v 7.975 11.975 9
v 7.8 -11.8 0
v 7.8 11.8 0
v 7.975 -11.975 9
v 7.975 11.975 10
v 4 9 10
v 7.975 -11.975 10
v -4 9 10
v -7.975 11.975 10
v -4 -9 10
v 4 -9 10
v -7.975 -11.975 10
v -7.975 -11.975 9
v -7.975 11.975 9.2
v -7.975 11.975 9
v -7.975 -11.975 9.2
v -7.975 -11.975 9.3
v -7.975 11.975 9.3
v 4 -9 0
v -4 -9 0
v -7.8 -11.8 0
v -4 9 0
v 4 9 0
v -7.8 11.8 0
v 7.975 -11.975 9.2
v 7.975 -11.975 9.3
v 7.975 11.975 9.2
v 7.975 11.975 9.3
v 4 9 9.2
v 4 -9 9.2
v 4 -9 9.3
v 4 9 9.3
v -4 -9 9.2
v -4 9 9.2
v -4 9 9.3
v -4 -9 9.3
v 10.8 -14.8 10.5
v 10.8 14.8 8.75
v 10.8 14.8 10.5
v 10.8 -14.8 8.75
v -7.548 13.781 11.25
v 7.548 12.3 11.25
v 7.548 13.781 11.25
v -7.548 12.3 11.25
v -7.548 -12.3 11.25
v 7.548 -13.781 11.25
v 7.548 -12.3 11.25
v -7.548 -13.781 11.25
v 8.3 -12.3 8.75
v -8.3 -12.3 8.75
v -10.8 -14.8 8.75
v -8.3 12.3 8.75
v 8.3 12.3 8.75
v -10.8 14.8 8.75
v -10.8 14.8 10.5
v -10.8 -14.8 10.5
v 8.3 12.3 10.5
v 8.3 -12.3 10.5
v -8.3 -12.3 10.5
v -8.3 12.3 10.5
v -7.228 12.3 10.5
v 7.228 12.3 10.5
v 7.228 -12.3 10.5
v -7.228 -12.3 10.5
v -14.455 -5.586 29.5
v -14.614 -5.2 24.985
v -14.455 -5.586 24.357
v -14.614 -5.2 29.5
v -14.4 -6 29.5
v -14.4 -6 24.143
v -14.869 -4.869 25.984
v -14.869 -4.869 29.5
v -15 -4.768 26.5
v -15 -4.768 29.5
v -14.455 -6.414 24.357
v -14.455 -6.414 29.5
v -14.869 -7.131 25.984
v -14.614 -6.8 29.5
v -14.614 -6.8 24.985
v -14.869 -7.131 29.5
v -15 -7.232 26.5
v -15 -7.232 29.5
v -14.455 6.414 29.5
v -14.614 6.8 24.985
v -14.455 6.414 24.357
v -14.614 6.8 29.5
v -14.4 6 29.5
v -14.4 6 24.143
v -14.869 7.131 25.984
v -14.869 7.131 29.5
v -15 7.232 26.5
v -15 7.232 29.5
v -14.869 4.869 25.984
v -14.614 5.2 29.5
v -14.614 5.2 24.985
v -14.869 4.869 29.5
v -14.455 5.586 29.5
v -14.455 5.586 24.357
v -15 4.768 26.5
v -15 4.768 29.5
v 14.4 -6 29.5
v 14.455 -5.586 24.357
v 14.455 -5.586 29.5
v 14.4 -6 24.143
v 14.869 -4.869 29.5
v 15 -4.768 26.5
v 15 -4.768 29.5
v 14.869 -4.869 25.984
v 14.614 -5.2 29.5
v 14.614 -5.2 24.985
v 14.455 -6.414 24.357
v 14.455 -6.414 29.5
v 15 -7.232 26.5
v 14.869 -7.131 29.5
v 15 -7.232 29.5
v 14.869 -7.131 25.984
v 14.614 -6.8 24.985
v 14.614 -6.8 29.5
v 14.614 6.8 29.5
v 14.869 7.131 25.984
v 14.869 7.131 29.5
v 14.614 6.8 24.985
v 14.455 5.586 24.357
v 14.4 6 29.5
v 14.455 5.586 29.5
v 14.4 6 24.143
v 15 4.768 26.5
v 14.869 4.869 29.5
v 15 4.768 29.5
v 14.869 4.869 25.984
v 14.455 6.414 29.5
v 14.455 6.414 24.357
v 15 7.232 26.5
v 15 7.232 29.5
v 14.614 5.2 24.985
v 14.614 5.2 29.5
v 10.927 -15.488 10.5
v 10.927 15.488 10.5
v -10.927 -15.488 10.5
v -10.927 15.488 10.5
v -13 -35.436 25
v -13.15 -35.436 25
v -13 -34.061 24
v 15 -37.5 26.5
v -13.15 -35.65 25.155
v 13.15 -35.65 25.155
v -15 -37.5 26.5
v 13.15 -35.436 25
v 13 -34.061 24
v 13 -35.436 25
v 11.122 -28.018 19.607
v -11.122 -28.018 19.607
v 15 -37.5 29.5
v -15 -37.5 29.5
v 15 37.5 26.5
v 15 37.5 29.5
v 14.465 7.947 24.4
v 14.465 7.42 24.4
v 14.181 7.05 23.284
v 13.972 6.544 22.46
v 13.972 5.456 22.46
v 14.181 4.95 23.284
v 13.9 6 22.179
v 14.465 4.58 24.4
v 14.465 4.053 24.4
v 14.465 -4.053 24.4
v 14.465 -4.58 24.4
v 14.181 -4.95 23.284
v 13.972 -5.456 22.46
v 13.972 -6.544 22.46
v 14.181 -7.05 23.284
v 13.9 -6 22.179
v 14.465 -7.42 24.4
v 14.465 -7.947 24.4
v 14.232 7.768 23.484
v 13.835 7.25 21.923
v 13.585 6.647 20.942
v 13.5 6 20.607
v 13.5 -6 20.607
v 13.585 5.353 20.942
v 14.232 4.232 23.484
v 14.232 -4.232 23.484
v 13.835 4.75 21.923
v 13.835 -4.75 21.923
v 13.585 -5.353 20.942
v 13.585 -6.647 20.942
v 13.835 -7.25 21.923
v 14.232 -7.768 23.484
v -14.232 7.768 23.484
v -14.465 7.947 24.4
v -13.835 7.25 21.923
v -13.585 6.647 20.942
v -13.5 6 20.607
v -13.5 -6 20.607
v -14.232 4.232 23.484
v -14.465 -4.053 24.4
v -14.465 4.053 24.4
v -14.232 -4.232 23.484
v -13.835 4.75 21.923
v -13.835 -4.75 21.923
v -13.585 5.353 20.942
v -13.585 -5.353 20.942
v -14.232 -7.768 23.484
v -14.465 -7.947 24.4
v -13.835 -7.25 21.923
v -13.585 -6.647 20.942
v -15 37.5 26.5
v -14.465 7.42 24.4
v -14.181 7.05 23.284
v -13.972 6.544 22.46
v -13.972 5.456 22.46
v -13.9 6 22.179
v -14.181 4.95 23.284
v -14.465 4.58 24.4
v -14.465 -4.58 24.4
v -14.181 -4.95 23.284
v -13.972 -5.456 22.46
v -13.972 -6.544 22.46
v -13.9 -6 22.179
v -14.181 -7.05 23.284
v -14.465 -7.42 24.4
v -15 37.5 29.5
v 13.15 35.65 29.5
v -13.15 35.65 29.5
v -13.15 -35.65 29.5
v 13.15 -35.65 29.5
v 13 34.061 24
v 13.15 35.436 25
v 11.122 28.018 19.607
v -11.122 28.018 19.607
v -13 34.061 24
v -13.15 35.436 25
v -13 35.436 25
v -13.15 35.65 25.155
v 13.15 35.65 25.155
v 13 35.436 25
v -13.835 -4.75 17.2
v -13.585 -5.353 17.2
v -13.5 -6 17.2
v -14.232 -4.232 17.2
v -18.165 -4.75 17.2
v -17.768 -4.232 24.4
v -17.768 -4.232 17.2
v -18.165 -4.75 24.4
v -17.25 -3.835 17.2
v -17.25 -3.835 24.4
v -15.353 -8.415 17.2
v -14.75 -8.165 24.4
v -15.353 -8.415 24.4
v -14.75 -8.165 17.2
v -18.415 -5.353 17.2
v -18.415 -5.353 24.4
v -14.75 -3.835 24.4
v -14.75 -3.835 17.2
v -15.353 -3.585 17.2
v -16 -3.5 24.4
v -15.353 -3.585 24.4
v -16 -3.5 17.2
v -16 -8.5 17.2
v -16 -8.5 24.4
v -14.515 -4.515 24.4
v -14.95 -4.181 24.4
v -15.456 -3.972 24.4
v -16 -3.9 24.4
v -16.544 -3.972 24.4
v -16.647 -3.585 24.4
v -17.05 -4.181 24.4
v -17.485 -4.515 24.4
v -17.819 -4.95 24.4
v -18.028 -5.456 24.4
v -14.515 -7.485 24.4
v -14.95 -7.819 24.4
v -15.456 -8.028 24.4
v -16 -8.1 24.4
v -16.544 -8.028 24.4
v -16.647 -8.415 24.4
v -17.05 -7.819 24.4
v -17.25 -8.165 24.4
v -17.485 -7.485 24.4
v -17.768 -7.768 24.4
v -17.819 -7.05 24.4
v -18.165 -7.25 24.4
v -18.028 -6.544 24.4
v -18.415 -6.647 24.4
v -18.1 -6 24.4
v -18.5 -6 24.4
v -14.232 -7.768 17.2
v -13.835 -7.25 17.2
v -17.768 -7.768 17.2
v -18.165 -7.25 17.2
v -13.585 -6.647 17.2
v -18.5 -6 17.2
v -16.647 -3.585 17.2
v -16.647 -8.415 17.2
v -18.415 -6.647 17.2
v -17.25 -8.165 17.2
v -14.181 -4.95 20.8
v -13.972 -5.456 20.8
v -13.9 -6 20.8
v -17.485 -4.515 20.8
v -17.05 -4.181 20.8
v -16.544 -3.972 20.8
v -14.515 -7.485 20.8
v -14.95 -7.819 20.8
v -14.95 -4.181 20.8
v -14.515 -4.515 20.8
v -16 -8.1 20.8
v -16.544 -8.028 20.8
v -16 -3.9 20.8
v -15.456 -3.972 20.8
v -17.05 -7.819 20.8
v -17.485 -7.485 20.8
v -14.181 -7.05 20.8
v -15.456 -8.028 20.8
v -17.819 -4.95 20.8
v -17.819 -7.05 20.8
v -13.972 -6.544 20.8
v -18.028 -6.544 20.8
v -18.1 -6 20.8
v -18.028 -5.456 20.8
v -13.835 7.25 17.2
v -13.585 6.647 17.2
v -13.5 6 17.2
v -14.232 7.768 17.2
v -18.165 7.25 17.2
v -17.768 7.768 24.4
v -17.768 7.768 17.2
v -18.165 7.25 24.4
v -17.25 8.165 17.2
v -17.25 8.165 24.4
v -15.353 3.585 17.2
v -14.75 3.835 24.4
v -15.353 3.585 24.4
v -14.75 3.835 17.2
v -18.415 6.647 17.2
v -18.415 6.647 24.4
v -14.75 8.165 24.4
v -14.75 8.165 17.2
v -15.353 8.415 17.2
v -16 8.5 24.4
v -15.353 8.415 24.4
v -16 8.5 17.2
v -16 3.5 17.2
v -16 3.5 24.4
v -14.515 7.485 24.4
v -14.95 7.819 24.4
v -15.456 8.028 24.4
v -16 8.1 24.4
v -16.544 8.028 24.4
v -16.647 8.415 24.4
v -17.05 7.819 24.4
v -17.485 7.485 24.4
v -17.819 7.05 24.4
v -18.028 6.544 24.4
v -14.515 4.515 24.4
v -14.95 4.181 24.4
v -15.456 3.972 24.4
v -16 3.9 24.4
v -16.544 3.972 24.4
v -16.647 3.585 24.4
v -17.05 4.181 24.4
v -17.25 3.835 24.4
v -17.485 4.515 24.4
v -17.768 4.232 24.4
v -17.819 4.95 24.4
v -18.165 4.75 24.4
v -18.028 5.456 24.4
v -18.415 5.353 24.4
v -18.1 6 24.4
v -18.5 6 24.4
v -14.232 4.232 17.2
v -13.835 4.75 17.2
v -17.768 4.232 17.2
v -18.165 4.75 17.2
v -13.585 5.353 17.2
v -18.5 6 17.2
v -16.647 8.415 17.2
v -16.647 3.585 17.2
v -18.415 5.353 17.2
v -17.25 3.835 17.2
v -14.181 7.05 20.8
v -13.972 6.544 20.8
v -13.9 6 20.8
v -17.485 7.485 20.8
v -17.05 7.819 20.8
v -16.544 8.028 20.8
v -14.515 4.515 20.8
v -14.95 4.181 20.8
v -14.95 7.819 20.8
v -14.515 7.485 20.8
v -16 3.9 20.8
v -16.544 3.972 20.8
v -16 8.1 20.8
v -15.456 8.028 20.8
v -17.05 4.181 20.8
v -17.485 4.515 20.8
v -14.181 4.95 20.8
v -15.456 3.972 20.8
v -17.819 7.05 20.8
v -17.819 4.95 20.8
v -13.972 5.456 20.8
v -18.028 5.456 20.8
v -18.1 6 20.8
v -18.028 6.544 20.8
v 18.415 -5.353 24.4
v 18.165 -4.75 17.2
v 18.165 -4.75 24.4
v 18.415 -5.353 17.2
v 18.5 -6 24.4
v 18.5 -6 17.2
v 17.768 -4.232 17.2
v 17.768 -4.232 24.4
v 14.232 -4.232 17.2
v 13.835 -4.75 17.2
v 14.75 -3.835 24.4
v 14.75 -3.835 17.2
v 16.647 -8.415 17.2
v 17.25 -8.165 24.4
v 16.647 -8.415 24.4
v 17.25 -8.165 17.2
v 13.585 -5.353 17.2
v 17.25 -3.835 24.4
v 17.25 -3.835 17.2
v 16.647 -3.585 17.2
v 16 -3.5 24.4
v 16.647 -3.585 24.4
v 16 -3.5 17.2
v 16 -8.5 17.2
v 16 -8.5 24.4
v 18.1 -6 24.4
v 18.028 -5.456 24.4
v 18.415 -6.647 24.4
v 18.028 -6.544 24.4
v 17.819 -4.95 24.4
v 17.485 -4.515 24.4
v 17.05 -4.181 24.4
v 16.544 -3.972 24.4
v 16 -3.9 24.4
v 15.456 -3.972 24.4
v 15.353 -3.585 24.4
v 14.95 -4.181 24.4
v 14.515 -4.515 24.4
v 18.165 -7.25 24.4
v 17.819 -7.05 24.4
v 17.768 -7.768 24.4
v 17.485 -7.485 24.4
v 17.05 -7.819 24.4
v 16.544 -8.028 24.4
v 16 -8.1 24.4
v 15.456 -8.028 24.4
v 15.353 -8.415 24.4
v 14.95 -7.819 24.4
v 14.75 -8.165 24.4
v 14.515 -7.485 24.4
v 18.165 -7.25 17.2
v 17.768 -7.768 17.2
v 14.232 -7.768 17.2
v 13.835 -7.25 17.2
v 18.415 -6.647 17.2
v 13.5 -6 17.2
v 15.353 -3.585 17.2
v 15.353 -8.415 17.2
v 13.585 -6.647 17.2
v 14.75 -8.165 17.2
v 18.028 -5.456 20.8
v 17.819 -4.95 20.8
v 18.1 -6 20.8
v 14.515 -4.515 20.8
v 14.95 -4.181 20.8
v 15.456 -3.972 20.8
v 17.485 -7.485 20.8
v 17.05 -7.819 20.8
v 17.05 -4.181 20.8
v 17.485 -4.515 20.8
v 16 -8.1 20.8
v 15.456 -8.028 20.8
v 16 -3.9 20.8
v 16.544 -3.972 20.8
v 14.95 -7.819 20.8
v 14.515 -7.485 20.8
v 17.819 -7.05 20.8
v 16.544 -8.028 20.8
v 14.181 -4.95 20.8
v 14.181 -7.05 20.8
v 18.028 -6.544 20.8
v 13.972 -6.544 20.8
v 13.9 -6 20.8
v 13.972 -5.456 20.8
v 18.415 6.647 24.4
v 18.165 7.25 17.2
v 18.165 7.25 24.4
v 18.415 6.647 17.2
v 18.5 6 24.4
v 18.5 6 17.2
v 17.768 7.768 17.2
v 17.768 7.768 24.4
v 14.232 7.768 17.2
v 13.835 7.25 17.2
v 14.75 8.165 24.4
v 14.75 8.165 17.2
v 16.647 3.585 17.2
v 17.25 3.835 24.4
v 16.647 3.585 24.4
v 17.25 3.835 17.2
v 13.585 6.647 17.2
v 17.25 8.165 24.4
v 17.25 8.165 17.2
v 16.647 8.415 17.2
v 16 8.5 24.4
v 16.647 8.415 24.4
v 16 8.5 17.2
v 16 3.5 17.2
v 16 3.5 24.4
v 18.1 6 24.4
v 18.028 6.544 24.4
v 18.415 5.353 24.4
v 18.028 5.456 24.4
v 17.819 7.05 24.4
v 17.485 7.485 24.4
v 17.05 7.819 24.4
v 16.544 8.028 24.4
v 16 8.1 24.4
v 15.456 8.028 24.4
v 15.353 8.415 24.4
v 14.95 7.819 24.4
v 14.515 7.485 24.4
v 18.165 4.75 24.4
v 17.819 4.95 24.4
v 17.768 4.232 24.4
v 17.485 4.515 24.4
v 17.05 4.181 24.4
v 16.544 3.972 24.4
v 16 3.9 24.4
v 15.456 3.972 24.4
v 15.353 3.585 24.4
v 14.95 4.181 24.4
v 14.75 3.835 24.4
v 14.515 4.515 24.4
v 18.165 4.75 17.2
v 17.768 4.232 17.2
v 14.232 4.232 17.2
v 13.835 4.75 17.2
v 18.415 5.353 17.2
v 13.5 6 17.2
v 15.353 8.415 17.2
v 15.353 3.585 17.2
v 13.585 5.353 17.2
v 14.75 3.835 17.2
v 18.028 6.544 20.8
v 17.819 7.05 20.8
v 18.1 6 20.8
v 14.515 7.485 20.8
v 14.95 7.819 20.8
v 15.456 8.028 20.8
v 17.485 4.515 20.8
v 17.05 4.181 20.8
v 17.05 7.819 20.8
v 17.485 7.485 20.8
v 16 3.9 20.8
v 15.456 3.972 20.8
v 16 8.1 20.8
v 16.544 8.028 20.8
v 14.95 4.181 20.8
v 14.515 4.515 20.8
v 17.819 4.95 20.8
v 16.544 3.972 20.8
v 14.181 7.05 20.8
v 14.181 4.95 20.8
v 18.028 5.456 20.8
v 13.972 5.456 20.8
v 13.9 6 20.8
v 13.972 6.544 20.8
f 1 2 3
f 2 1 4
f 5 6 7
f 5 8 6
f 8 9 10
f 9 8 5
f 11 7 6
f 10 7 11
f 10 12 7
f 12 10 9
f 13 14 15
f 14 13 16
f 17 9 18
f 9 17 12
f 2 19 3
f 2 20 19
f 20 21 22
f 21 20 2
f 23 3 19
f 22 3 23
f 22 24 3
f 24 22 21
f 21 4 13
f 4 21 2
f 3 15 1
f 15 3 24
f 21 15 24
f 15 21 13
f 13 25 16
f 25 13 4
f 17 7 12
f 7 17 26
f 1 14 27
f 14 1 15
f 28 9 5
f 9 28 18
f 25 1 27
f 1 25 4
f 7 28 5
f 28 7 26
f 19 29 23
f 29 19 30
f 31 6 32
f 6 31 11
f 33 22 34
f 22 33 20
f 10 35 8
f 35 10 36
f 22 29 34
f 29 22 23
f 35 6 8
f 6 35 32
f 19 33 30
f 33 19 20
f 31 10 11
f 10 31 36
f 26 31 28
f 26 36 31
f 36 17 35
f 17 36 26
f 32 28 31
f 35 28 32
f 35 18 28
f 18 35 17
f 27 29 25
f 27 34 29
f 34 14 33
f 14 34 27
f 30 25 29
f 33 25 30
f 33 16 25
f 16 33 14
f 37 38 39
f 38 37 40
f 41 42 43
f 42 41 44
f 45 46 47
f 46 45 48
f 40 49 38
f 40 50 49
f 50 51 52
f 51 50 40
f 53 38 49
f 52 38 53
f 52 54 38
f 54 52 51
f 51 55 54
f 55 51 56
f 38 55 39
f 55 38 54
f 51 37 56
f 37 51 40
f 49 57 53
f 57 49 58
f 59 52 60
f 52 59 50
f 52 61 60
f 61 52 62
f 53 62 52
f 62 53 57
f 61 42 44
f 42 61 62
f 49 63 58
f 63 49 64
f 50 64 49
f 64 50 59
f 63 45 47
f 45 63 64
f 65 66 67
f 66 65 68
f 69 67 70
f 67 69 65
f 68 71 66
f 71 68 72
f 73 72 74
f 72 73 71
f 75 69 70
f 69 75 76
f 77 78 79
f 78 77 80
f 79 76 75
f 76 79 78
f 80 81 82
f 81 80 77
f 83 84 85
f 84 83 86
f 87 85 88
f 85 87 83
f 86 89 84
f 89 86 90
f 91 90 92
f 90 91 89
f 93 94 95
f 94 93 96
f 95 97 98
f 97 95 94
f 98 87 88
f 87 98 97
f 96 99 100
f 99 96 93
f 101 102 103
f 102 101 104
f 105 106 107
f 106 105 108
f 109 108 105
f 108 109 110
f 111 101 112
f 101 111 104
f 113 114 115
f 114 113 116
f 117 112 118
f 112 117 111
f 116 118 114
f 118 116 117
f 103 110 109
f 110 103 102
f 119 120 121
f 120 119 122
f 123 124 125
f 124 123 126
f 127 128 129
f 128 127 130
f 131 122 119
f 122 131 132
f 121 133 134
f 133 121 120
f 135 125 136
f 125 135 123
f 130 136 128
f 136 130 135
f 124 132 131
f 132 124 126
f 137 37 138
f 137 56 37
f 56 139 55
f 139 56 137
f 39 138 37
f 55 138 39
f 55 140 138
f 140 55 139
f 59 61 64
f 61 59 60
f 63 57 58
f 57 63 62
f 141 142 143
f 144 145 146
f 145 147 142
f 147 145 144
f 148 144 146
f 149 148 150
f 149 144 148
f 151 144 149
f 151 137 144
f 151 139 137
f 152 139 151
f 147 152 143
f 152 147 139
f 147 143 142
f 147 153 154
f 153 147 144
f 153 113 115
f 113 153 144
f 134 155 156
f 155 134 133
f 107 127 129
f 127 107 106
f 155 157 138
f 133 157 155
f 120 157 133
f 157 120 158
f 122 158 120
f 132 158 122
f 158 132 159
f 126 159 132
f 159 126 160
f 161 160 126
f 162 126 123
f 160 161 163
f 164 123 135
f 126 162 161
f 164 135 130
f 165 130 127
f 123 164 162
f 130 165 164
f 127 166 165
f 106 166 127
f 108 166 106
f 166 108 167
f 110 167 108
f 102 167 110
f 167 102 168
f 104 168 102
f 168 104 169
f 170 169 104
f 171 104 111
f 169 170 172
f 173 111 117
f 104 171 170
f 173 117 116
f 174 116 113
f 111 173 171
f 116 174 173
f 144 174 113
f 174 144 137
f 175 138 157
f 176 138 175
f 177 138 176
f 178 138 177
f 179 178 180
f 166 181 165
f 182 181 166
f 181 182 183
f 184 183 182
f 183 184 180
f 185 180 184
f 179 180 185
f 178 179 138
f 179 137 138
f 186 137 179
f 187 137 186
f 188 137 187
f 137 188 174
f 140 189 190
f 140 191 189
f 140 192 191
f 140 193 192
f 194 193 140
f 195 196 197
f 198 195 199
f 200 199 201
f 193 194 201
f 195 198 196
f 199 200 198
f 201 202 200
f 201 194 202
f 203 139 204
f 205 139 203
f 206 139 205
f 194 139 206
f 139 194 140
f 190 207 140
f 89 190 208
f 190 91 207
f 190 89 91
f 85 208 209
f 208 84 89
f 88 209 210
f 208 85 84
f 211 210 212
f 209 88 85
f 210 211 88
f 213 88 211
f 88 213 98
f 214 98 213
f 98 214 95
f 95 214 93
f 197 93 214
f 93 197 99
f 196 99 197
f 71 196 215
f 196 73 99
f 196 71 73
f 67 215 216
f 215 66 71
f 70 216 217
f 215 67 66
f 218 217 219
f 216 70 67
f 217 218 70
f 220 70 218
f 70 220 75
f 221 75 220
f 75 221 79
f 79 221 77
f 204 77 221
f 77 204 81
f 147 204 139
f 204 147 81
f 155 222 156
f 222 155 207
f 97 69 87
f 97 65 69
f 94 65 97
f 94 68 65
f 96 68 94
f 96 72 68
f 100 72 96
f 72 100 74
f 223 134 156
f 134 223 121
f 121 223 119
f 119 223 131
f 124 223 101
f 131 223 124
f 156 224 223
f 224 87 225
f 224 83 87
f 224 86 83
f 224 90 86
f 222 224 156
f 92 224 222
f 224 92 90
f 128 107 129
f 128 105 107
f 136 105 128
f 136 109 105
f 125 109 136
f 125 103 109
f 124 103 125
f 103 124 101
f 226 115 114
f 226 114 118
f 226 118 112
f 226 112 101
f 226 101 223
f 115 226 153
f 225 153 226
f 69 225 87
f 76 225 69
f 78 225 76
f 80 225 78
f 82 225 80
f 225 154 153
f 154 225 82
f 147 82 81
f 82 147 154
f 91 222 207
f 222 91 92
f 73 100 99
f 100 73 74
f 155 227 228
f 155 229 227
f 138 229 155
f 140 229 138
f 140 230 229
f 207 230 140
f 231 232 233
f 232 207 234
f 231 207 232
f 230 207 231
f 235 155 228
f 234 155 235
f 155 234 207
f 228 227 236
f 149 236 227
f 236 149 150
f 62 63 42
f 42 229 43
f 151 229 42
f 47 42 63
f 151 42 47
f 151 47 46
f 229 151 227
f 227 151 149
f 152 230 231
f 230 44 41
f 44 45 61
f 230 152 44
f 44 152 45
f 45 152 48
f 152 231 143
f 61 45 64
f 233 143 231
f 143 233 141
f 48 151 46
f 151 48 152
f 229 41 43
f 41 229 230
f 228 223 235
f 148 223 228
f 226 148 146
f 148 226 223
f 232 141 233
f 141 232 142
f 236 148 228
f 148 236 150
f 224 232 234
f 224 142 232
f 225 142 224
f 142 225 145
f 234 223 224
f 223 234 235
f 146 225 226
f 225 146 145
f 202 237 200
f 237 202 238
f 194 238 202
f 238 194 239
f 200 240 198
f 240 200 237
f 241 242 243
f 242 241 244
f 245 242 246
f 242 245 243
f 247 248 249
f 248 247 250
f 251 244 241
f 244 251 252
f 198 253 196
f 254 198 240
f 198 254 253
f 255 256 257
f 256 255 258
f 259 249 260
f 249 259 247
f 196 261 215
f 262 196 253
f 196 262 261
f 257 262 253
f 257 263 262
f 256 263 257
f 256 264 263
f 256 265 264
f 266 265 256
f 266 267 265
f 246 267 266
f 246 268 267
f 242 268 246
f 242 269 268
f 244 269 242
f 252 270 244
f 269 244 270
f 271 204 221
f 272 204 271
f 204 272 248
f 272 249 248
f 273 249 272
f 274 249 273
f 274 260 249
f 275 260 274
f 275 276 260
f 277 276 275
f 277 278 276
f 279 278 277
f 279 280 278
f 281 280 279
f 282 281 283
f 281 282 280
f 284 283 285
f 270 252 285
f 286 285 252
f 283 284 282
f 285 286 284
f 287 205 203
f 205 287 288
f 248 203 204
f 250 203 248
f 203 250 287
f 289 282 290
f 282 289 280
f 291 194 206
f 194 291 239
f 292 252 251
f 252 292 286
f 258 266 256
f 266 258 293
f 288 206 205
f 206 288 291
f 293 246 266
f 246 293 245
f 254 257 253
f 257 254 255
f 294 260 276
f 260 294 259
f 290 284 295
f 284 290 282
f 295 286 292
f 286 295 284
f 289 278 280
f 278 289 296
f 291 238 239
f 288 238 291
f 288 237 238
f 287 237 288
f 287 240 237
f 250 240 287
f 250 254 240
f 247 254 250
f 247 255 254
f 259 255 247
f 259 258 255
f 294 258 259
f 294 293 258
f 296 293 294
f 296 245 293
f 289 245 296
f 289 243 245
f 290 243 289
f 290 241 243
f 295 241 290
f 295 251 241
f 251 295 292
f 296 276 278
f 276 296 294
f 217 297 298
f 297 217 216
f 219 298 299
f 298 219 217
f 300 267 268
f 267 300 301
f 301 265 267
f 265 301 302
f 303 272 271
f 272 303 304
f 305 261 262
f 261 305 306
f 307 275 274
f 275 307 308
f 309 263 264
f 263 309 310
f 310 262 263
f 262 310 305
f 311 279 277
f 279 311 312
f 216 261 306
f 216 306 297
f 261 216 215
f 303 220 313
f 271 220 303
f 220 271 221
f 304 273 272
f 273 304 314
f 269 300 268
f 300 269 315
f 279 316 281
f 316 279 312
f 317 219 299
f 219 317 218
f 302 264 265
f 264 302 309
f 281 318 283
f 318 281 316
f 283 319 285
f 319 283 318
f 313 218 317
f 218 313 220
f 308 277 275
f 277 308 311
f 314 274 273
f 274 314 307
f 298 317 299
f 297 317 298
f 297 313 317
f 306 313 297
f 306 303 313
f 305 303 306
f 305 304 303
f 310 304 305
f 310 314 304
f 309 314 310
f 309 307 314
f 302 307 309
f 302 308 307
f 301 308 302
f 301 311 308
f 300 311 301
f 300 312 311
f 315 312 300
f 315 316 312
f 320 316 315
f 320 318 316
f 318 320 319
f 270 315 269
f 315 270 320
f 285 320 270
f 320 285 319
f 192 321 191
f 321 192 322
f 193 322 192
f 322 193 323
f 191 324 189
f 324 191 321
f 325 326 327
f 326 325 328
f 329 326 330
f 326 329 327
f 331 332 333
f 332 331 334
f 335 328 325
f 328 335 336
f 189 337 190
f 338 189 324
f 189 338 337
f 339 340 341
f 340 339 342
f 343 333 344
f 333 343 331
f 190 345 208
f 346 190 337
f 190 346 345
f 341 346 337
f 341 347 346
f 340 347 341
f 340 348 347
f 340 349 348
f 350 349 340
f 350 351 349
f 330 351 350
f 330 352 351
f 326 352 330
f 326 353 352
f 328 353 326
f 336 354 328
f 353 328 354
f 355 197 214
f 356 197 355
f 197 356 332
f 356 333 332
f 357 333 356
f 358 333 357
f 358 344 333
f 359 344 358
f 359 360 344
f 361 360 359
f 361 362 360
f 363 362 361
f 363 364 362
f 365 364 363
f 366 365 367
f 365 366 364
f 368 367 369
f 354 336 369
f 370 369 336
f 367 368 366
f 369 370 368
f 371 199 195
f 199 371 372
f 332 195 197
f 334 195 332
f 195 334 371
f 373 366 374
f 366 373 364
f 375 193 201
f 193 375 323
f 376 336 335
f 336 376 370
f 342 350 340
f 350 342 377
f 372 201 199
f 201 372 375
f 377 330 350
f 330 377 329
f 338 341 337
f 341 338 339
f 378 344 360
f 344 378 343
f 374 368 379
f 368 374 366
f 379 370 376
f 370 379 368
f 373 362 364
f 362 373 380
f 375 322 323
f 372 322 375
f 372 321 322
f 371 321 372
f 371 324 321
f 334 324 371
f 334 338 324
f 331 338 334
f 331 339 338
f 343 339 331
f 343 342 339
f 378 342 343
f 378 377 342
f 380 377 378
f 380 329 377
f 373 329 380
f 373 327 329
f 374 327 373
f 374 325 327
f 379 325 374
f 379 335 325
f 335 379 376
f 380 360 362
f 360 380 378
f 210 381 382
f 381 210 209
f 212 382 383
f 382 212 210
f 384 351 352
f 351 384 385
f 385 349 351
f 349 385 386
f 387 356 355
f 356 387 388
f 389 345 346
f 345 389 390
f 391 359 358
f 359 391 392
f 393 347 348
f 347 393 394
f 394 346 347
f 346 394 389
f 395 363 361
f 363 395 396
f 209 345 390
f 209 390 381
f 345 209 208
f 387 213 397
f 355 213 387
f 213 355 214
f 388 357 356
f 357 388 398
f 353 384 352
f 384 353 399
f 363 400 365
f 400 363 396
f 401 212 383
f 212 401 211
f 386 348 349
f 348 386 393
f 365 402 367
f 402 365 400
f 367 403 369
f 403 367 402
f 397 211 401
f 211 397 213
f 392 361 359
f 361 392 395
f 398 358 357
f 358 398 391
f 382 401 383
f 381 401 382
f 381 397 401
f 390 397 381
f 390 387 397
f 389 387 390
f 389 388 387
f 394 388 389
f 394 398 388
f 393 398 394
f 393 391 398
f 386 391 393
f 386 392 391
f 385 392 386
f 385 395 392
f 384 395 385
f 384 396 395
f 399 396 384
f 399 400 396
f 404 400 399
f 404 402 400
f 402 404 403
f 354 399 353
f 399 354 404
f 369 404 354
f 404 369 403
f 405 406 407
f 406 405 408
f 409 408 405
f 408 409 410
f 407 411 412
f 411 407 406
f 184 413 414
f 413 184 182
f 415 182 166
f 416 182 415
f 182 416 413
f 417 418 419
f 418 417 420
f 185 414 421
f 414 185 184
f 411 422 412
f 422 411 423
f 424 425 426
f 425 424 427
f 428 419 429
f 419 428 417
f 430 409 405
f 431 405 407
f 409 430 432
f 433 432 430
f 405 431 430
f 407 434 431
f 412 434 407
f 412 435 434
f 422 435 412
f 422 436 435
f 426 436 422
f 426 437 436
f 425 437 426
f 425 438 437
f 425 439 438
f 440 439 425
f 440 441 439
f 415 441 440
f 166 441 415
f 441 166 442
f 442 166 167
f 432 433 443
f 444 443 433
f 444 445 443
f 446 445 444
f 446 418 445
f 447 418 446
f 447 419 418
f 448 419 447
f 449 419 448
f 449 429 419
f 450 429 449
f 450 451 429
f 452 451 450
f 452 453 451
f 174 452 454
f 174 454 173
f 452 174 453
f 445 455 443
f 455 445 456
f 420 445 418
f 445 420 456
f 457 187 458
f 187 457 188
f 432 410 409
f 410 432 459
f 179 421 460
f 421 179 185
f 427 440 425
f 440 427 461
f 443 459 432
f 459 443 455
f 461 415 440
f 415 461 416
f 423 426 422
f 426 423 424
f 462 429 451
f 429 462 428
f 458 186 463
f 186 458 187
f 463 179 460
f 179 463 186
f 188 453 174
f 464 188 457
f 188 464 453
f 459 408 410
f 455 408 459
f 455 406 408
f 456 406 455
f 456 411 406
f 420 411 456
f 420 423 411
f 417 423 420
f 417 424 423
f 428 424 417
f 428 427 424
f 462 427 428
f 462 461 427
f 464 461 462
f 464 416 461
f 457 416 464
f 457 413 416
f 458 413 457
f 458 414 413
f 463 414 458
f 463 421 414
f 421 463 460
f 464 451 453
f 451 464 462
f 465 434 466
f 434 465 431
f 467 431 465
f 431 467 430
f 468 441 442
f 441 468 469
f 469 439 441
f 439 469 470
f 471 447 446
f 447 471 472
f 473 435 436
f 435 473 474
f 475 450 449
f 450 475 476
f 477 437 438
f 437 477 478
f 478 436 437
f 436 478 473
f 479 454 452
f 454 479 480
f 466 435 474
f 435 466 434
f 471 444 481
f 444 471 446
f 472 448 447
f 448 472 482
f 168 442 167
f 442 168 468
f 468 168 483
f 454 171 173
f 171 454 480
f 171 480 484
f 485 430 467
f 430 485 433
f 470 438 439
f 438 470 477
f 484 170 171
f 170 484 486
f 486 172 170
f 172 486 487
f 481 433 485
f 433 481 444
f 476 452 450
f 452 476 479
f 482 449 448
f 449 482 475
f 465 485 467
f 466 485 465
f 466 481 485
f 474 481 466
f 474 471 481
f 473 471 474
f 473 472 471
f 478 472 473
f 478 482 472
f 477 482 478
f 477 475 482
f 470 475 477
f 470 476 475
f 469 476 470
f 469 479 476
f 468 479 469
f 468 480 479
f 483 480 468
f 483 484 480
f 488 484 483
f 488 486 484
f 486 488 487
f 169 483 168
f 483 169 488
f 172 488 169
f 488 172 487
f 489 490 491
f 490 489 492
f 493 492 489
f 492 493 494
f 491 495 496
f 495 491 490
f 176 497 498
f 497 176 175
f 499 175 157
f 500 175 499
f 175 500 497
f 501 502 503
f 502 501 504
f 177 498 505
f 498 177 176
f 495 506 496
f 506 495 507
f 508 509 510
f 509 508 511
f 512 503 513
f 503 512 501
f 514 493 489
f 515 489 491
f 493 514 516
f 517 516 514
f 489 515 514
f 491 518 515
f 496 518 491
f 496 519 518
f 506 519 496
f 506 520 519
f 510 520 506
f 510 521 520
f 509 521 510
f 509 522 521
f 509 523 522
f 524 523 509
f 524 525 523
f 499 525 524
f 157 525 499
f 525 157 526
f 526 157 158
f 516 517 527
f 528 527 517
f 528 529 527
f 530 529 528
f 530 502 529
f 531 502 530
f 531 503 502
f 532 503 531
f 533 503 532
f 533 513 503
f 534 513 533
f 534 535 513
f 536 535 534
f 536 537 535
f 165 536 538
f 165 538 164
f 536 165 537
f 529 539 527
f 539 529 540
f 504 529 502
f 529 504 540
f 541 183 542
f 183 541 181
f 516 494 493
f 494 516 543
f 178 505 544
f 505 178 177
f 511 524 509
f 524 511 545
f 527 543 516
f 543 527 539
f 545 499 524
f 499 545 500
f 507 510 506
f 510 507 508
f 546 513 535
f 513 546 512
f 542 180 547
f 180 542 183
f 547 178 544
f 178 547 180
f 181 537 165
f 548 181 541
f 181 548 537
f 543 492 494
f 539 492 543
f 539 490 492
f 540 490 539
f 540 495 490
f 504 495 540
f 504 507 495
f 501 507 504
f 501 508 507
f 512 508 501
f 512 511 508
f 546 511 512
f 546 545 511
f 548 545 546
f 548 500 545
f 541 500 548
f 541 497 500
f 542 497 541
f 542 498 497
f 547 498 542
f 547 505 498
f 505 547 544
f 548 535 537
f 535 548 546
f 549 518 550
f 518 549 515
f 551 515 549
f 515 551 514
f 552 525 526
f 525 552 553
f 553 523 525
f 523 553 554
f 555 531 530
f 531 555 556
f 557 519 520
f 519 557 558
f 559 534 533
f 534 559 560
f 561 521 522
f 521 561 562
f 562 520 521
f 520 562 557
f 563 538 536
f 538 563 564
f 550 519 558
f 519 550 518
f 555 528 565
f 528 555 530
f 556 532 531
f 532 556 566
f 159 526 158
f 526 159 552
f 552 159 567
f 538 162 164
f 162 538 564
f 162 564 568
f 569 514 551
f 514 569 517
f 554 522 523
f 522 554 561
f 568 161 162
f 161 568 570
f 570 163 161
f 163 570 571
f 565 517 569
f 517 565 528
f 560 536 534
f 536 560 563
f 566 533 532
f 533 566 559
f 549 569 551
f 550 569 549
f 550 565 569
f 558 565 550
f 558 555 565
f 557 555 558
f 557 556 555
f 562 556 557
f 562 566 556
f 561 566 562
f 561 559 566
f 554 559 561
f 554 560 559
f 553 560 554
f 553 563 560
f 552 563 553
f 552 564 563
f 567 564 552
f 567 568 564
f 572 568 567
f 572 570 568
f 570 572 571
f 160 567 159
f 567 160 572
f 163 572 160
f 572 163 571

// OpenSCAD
// file: sleds.scad
// ==========================================
// Xentient Framework - Universal Sled & Socket Library
// Shared modules for all peripheral caps
// ==========================================
// Per Framework §2: Universal Mating Protocol
// Female Socket (in hub): 24.4×16.4×10.0mm (0.4mm clearance), wire channel 18×8mm
// Male Sled (on cap base): 23.6×15.6×10.0mm, 1° draft, hollow 18×8mm
// Flange: +3mm each side (increased from +2mm for bearing strength)
// Units: mm

$fn = 64;

// ==========================================
// MALE SLED PARAMETERS
// ==========================================

Sled_W       = 23.6;    // Width (0.4mm tolerance in female 24.0mm)
Sled_H       = 15.6;    // Height (0.4mm tolerance in female 16.0mm)
Sled_D       = 10.0;    // Depth (insertion length)
Sled_Draft   = 1.0;     // 1-degree draft angle
Sled_Wire_W  = 18.0;    // Wire pass-through width
Sled_Wire_H  = 8.0;     // Wire pass-through height
Sled_Wall    = 2.0;     // Minimum wall thickness

// Derived
Sled_Draft_Off = Sled_D * tan(Sled_Draft);  // ~0.17mm per side

// ==========================================
// MODULE: male_sled()
// The plug base that inserts into the hub's female socket.
// All caps start with this at their base.
//
// Usage: difference() { male_sled(); /* your cap-specific cutouts */ }
// ==========================================

module male_sled() {
    difference() {
        // Outer body with 1° draft
        hull() {
            // Entry face (slightly larger for wedge fit)
            translate([0, 0, Sled_D - 0.5])
                cube([Sled_H + 2*Sled_Draft_Off,
                      Sled_W + 2*Sled_Draft_Off,
                      1], center=true);
            // Inner face (exact size)
            translate([0, 0, 0.5])
                cube([Sled_H, Sled_W, 1], center=true);
        }

        // Wire pass-through (hollow core)
        translate([0, 0, Sled_D / 2])
            cube([Sled_Wire_H, Sled_Wire_W, Sled_D + 2], center=true);

        // Entry chamfer (45° for easy insertion)
        chamfer_h = 1.5;
        translate([0, 0, Sled_D - chamfer_h/2])
            hull() {
                cube([Sled_H + 2*chamfer_h, Sled_W + 2*chamfer_h, 0.1], center=true);
                cube([Sled_H, Sled_W, 0.1], center=true);
            }
    }
}

// ==========================================
// MODULE: male_sled_with_flange()
// Adds a flange around the sled base for cap-to-hub transition.
// Flange sits flush against hub exterior face.
//
// flange_w: extra width beyond sled on each side
// flange_h: extra height beyond sled on each side
// flange_t: flange thickness
// ==========================================

module male_sled_with_flange(flange_w=3.0, flange_h=3.0, flange_t=2.0) {
    union() {
        male_sled();

        // Flange ring around sled entry
        translate([0, 0, Sled_D])
            difference() {
                cube([Sled_H + 2*flange_h,
                      Sled_W + 2*flange_w,
                      flange_t], center=true);
                // Cut sled opening through flange
                cube([Sled_H + 1, Sled_W + 1, flange_t + 2], center=true);
            }
    }
}

// ==========================================
// MODULE: wire_channel()
// Internal wire routing channel from sled to component.
// Extends from sled core outward through the cap body.
//
// length: distance from sled to component
// direction: "straight" or "angled"
// ==========================================

module wire_channel(length=15, direction="straight") {
    if (direction == "straight") {
        translate([0, 0, Sled_D / 2 + length / 2])
            cube([Sled_Wire_H, Sled_Wire_W, length + 1], center=true);
    }
}

// ==========================================
// VISUALIZATION HELPERS
// ==========================================

// Render just the sled for testing
// male_sled();
// main file
// ==========================================
// Xentient Framework - Housing 6: Display (LCD 16×2)
// Flared monitor with bezel, M3 standoffs, snap-fit backplate
// ==========================================
// Component: LCD 16×2 + PCF8574 I2C backpack (71×26×15mm)
// Connection: 4-pin JST XH pigtail (I2C: VCC, GND, SDA, SCL)
// Socket: CENTER FRONT (dedicated, not side port)
// Per Framework §4 Housing 6
// EXCLUSIVE: Plugs into front center socket only
// Units: mm

include <sleds.scad>;

$fn = 64;

// ==========================================
// COMPONENT DIMENSIONS
// ==========================================

LCD_W       = 71.0;    // LCD module width
LCD_H       = 26.0;    // LCD module height
LCD_D       = 15.0;    // LCD + backpack depth
LCD_Mount_X = 32.0;    // M3 mounting hole span X (was in v3 as 32mm)
LCD_Mount_Y = 12.0;    // M3 mounting hole span Y

// Housing dimensions
Bezel_W     = 75.0;    // Outer bezel width (71mm LCD + 2mm each side)
Bezel_H     = 30.0;    // Outer bezel height (26mm LCD + 2mm each side)
Flare_Depth = 18.0;    // Depth from sled face to LCD face
House_Wall  = 2.0;    // Wall thickness
Backplate_T = 1.5;    // Snap-fit backplate thickness

// ==========================================
// MODULE: housing_display()
// Rapid flare from 24×16 sled to 75×30 bezel
// ==========================================

module housing_display() {
    union() {
        // Sled base with flange (wider for display)
        male_sled_with_flange(flange_w=3.0, flange_h=3.0, flange_t=2.5);

        // Flared monitor body
        translate([0, 0, Sled_D]) {
            difference() {
                // Outer shell: sled → bezel flare
                hull() {
                    // Transition from sled face
                    translate([0, 0, 1])
                        cube([Sled_H + 6, Sled_W + 6, 2], center=true);
                    // Full bezel face
                    translate([0, 0, Flare_Depth])
                        cube([Bezel_H, Bezel_W, 3], center=true);
                }

                // Inner cavity
                hull() {
                    translate([0, 0, 0.5])
                        cube([Sled_H - 2, Sled_W - 2, 2], center=true);
                    translate([0, 0, Flare_Depth - House_Wall])
                        cube([Bezel_H - 2*House_Wall, Bezel_W - 2*House_Wall, 4], center=true);
                }

                // LCD window (front face, exact cutout)
                translate([0, 0, Flare_Depth])
                    cube([LCD_H + 0.3, LCD_W + 0.3, House_Wall + 4], center=true);

                // Wire channel from sled to LCD
                translate([0, 0, -2])
                    cube([Sled_Wire_H, Sled_Wire_W, Flare_Depth + 6], center=true);

                // M3 mounting holes for LCD backpack
                for (sx = [-1, 1], sy = [-1, 1]) {
                    translate([sx * LCD_Mount_X / 2, sy * LCD_Mount_Y / 2, Flare_Depth * 0.6])
                        cylinder(h=Flare_Depth, d=3.2, center=true, $fn=24);
                }

                // Snap-fit backplate channel (rear face)
                translate([0, 0, -House_Wall/2])
                    difference() {
                        cube([Bezel_H + 2, Bezel_W + 2, House_Wall + 1], center=true);
                        // Snap ridge
                        for (side = [-1, 1]) {
                            translate([0, side * (Bezel_W/2 + 0.5), 0])
                                cube([Bezel_H - 4, 1.0, House_Wall + 2], center=true);
                        }
                    }
            }

            // M3 heat-set insert bosses for LCD mount
            for (sx = [-1, 1], sy = [-1, 1]) {
                translate([sx * LCD_Mount_X / 2, sy * LCD_Mount_Y / 2, Flare_Depth * 0.4])
                    difference() {
                        cylinder(h=Flare_Depth * 0.4, d=5.0, $fn=24);
                        translate([0, 0, Flare_Depth * 0.2])
                            cylinder(h=Flare_Depth * 0.3 + 1, d=4.2, $fn=24);  // M3 heat-set insert
                    }
            }
        }
    }
}

// ==========================================
// MODULE: display_backplate()
// Snap-fit backplate to enclose LCD
// ==========================================

module display_backplate() {
    difference() {
        // Backplate body
        cube([Bezel_H - 4, Bezel_W - 4, Backplate_T], center=true);

        // Snap ridge notches
        for (side = [-1, 1]) {
            translate([0, side * (Bezel_W/2 - 3), 0])
                cube([Bezel_H - 8, 1.2, Backplate_T + 2], center=true);
        }

        // M3 screw holes
        for (sx = [-1, 1], sy = [-1, 1]) {
            translate([sx * LCD_Mount_X / 2, sy * LCD_Mount_Y / 2, 0])
                cylinder(h=Backplate_T + 2, d=3.2, center=true, $fn=24);
        }

        // Wire routing notch
        translate([0, 0, 0])
            cube([Sled_Wire_H + 2, Sled_Wire_W + 2, Backplate_T + 2], center=true);
    }
}

// ==========================================
// RENDER
// ==========================================

housing_display();

// Backplate rendered offset for visualization
%translate([0, Bezel_W + 10, 0]) display_backplate();
